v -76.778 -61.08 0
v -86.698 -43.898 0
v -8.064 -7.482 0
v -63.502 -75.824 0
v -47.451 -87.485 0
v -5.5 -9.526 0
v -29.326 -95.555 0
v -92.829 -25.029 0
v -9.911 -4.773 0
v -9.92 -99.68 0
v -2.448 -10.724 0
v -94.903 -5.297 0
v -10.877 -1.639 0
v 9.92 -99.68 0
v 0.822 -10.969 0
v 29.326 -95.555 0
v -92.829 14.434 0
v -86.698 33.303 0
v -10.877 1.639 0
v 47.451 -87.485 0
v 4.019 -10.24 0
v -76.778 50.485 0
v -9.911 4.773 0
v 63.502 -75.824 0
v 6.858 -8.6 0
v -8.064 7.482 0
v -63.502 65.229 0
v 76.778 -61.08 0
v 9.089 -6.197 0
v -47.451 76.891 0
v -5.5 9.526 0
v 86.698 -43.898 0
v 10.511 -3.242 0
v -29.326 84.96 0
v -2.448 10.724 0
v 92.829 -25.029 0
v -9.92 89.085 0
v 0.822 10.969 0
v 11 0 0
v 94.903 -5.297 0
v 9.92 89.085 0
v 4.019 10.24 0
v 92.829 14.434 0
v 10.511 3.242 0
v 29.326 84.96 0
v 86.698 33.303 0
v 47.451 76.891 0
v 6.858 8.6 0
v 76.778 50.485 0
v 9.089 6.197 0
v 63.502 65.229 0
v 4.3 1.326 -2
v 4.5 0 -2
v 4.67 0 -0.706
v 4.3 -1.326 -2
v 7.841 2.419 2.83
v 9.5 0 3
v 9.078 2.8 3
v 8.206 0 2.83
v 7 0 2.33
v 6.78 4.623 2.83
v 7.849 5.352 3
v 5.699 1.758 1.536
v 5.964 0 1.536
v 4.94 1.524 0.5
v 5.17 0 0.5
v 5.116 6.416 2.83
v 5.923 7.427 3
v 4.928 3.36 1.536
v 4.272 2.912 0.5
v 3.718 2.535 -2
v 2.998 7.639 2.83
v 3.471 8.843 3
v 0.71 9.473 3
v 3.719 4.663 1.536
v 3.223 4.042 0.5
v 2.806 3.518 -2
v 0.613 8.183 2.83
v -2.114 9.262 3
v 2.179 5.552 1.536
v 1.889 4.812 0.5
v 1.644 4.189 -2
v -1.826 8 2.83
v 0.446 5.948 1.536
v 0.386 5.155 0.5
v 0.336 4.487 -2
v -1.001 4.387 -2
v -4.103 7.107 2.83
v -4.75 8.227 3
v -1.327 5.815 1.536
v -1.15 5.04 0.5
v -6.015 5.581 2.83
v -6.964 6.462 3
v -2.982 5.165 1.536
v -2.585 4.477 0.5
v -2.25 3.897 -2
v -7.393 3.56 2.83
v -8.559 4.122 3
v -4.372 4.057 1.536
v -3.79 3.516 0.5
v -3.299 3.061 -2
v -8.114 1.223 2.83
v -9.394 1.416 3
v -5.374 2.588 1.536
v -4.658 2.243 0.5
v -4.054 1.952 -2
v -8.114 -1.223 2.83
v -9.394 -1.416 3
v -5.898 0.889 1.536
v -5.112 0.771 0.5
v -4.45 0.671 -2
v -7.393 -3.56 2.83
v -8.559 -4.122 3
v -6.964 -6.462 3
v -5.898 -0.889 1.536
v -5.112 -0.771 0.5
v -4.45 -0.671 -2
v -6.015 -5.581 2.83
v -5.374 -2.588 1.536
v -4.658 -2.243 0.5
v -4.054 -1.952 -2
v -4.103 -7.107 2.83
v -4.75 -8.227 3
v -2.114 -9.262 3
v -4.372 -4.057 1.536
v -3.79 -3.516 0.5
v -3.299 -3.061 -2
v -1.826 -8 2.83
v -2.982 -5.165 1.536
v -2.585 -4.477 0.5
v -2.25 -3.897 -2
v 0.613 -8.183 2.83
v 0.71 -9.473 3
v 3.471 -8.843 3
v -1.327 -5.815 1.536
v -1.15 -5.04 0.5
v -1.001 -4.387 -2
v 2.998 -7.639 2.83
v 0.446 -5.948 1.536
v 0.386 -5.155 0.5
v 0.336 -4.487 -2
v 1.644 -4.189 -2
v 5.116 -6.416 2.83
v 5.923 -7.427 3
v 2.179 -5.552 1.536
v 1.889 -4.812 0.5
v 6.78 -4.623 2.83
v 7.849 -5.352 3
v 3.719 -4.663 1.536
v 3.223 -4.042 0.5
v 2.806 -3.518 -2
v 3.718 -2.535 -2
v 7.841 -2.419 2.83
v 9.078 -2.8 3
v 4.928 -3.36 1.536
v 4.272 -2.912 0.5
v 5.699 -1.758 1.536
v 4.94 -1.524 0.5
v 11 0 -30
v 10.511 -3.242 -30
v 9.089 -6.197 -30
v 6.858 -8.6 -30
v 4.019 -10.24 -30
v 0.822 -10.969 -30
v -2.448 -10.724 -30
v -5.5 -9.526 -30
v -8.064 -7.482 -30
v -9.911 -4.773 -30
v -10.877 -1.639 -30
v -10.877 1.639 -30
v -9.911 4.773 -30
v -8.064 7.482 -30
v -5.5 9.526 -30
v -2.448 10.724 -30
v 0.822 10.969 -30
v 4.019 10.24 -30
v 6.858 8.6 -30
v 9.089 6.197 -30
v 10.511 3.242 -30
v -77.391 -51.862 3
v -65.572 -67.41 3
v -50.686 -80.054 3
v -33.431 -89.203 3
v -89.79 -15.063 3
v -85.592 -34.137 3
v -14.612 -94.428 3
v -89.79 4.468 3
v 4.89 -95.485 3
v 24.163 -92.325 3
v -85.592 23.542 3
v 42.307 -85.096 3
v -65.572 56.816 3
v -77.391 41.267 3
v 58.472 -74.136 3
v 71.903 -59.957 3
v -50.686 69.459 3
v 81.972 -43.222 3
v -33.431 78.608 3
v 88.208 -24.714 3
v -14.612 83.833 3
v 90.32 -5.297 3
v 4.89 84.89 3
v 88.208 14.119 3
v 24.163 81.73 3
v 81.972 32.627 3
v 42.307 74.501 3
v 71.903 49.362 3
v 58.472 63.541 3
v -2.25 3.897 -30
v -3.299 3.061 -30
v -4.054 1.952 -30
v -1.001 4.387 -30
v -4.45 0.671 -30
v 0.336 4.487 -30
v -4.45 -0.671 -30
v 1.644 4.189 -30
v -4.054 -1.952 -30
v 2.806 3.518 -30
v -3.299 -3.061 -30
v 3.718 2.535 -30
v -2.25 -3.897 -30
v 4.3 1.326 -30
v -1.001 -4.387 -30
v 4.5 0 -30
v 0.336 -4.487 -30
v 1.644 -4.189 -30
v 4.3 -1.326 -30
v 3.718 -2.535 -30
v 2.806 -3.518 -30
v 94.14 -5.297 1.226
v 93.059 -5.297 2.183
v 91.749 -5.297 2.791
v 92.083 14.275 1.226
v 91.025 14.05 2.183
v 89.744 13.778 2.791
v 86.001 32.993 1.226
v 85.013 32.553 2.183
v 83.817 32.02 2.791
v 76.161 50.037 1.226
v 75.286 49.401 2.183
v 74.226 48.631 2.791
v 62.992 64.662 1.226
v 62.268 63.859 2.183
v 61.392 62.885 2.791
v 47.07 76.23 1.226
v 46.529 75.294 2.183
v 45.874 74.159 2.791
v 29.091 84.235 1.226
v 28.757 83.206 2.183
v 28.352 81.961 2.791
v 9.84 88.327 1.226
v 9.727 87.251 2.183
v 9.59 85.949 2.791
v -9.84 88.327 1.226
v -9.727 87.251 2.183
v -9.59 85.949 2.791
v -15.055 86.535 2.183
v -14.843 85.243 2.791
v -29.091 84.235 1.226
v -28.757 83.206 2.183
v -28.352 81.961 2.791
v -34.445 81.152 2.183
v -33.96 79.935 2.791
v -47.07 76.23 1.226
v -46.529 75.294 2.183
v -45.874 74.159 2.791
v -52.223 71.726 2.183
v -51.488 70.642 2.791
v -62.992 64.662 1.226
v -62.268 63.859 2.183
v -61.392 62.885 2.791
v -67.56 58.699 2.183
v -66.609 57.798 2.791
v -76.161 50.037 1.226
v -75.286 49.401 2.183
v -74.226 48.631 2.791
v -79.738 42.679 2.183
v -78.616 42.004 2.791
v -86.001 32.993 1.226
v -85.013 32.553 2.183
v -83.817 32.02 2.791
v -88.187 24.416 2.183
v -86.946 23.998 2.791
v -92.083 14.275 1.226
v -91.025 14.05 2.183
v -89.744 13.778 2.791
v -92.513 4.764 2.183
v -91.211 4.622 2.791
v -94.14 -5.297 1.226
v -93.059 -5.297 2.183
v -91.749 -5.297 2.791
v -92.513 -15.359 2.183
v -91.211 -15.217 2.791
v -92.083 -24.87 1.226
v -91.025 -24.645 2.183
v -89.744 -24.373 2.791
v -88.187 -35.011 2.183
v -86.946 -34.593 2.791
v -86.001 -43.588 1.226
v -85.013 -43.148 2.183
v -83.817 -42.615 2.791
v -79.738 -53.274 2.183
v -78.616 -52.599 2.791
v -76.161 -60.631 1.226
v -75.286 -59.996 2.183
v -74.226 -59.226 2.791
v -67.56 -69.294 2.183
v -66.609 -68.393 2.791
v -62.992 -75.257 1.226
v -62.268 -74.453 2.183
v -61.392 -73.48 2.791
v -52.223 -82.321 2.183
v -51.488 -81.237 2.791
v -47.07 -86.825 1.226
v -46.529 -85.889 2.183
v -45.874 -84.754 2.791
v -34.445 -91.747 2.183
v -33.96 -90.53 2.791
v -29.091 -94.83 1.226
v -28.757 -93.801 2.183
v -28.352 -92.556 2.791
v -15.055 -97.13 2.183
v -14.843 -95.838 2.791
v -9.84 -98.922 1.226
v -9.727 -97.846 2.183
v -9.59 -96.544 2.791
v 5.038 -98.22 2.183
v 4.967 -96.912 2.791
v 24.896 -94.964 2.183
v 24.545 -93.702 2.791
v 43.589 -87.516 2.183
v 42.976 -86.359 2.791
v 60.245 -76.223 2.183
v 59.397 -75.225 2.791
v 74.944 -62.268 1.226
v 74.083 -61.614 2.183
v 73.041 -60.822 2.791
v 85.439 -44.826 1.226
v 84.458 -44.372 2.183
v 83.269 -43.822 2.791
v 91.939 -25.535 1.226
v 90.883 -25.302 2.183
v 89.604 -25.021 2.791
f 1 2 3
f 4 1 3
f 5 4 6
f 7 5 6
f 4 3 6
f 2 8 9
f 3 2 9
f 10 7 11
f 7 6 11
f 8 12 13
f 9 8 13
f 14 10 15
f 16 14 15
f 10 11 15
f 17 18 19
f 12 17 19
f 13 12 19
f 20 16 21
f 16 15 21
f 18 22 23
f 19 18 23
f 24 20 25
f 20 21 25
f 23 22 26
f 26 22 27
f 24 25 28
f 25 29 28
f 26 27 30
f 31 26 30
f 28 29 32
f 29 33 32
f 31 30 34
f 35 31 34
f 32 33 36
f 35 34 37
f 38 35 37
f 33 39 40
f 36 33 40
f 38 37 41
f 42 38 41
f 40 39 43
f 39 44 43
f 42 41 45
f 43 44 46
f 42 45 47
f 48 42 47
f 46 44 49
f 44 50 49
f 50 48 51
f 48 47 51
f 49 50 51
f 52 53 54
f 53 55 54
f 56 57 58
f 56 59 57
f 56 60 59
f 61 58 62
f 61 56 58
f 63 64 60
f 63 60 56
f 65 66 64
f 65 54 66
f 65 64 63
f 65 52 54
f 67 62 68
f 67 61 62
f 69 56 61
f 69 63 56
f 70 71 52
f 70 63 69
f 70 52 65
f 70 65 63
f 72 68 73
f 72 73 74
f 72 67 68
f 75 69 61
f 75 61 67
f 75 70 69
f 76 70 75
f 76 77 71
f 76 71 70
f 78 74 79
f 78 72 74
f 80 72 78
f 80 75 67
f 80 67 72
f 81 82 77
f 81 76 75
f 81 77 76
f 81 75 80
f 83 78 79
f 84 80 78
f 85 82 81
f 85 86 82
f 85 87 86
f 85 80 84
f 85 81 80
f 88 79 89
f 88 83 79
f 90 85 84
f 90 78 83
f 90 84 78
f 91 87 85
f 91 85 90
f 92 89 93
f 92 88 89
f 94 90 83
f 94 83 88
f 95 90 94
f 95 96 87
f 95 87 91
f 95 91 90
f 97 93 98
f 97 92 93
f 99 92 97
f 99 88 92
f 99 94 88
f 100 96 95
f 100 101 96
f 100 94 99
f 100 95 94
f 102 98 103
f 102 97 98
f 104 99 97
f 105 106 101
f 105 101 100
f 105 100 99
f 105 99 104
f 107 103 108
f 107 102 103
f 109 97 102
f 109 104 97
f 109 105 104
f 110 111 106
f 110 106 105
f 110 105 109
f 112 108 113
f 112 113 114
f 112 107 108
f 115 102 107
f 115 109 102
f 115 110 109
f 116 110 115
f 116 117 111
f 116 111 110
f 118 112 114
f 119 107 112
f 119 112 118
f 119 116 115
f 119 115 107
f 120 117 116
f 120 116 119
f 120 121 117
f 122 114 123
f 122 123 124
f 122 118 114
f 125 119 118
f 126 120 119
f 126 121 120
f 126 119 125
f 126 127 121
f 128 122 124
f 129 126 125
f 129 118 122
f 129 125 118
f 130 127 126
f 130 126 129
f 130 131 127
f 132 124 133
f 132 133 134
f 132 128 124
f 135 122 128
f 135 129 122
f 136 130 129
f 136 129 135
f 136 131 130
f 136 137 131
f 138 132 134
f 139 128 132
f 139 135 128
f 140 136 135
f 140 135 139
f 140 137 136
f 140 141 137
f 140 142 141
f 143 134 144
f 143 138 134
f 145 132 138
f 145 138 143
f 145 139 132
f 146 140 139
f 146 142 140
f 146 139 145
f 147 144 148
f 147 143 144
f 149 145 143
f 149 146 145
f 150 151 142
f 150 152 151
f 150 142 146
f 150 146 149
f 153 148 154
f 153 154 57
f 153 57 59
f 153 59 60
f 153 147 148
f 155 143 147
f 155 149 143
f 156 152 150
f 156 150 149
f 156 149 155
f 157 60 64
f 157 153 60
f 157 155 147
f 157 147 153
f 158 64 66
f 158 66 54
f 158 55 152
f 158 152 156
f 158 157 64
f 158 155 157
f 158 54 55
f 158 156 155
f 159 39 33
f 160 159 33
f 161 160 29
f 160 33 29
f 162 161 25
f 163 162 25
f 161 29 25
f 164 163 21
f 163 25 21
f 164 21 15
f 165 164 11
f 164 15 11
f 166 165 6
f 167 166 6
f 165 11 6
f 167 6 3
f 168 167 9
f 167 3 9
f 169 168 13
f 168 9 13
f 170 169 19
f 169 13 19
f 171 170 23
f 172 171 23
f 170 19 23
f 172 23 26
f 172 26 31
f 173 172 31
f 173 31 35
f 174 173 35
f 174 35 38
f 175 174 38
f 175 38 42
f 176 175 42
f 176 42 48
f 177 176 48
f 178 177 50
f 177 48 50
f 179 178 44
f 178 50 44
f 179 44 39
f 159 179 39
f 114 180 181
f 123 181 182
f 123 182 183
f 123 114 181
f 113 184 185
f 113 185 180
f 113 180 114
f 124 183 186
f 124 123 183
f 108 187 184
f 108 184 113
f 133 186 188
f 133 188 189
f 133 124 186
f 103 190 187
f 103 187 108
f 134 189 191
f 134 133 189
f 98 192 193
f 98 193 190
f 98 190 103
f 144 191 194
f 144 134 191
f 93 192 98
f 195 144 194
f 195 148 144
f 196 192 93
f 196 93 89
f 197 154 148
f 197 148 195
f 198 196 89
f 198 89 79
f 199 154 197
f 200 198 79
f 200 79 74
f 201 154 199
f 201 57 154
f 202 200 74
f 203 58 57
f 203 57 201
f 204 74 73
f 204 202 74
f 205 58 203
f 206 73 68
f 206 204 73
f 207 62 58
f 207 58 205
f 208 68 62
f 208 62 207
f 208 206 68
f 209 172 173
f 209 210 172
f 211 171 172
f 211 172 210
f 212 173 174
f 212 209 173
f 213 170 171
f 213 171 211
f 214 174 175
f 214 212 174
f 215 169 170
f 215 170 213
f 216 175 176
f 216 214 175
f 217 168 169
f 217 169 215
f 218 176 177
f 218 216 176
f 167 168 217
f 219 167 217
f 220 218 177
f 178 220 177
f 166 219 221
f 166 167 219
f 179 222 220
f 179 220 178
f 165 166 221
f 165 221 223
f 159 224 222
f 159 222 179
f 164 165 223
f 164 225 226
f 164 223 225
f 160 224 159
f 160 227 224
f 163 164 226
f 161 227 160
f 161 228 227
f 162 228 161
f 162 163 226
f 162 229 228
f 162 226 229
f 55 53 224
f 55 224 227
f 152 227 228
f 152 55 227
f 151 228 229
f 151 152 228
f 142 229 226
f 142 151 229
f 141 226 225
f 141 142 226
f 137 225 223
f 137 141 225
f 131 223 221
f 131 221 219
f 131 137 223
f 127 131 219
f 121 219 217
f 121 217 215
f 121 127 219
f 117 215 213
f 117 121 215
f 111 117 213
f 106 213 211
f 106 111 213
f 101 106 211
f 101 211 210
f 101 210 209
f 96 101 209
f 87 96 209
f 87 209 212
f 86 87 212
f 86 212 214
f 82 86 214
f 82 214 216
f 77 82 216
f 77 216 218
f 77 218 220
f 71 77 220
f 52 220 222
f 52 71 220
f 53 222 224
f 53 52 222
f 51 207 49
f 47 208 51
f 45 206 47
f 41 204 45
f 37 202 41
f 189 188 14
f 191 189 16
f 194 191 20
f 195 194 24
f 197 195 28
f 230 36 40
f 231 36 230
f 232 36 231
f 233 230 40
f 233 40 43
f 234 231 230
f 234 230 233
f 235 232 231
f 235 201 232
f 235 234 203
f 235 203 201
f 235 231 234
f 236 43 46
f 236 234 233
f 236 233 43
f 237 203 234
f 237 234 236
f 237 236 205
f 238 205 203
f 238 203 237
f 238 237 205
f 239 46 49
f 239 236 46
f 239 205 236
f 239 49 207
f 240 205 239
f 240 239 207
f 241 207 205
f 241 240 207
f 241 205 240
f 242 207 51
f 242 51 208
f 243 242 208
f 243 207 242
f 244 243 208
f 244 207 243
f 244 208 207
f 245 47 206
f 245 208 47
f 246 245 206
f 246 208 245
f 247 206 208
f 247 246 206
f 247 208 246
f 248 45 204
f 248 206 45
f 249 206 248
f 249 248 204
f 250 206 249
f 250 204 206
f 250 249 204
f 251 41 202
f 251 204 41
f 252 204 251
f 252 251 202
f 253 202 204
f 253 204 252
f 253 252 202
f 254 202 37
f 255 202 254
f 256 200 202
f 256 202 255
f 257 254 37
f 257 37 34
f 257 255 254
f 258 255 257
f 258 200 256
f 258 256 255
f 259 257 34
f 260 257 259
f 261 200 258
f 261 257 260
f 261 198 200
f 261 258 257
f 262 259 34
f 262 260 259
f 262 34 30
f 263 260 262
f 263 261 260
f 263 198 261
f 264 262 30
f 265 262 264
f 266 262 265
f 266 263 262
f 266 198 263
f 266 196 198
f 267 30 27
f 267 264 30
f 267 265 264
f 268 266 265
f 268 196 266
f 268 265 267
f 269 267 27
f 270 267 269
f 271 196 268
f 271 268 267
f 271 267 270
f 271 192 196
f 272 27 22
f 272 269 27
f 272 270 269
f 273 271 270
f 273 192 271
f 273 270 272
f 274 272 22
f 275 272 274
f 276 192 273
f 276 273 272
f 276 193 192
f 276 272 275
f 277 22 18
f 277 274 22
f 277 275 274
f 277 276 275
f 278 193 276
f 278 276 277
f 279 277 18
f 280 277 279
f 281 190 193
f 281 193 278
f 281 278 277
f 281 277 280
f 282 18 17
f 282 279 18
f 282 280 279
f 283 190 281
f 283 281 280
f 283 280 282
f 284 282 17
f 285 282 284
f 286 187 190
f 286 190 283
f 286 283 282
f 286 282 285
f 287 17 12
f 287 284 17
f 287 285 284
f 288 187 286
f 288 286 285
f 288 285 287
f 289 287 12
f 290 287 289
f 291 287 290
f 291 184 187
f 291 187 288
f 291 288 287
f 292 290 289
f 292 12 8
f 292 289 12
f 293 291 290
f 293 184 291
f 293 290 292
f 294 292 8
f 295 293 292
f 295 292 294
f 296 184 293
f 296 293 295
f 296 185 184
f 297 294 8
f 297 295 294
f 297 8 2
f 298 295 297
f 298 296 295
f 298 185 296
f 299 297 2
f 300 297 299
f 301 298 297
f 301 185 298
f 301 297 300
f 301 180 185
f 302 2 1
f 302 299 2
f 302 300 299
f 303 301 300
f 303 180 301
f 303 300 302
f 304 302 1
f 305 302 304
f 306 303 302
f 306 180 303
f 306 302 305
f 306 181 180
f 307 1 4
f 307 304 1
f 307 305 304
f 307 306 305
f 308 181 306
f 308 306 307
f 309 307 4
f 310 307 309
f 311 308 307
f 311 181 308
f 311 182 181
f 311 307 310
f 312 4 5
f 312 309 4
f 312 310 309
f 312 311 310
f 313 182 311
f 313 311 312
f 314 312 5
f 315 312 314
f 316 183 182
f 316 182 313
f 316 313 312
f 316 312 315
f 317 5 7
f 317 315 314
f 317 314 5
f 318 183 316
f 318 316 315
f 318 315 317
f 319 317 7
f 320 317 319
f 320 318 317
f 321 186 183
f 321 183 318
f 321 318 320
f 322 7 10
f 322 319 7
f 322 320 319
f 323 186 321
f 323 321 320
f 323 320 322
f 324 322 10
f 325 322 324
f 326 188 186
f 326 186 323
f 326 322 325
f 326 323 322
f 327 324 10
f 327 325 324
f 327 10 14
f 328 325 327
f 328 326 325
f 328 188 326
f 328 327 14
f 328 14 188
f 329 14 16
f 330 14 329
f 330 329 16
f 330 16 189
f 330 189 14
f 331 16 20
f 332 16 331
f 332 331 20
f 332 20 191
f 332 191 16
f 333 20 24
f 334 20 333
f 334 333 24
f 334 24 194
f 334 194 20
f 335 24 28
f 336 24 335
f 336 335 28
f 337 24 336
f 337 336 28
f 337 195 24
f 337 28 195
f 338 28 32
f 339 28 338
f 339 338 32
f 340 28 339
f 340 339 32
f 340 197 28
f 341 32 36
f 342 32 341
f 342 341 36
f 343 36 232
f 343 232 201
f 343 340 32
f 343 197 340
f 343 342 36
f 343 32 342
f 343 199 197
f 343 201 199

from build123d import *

# Parameters (mm, degrees)
F0_R     = 94.9025273368
F0_R_2   = 4.5
F1_DEPTH = 3
F2_R     = 11
F2_R_2   = 4.5
F3_DEPTH = 30


# Not quite as in the source:
# - a fillet or chamfer that OpenCascade refuses, or shapes differently, is made with other operations: its cross-section is extruded or revolved along the edge and cut away or added


with BuildPart() as f1:
    # F0 (on Top) → F1 (new body)
    with BuildSketch(Plane.XY):
        with Locations((0, -5.2974726632)):
            Circle(F0_R)
        Circle(F0_R_2, mode=Mode.SUBTRACT)
    extrude(amount=F1_DEPTH)

    # F2 (on face) → F3 (join)
    with BuildSketch(Plane(origin=(0, 0, 0), x_dir=(1, 0, 0), z_dir=(0, 0, -1))):
        Circle(F2_R)
        Circle(F2_R_2, mode=Mode.SUBTRACT)
    extrude(amount=F3_DEPTH)

    # F4: fillet of radius 5 on 2 edges, made by hand

    # F4_s1 → F4_t2 (revolve, cut)
    with BuildSketch(Plane.XZ.offset(5.2974726632)):
        with BuildLine():
            ThreePointArc((94.9025273368, 0), (93.0585644294, 2.1833001327), (90.3199516419, 3))
            Line((90.3199516419, 3), (94.9025273368, 3))
            Line((94.9025273368, 3), (94.9025273368, 0))
        make_face()
    revolve(axis=Axis((0, -5.2974726632, 3), (0, 0, 1)), mode=Mode.SUBTRACT)

    # F4_s3 → F4_t4 (revolve, cut)
    with BuildSketch(Plane.XZ):
        with BuildLine():
            ThreePointArc((9.5, 3), (5.9644660941, 1.5355339059), (4.5, -2))
            Line((4.5, -2), (4.5, 3))
            Line((4.5, 3), (9.5, 3))
        make_face()
    revolve(axis=Axis((0, 0, 3), (0, 0, 1)), mode=Mode.SUBTRACT)


solid = f1.part
